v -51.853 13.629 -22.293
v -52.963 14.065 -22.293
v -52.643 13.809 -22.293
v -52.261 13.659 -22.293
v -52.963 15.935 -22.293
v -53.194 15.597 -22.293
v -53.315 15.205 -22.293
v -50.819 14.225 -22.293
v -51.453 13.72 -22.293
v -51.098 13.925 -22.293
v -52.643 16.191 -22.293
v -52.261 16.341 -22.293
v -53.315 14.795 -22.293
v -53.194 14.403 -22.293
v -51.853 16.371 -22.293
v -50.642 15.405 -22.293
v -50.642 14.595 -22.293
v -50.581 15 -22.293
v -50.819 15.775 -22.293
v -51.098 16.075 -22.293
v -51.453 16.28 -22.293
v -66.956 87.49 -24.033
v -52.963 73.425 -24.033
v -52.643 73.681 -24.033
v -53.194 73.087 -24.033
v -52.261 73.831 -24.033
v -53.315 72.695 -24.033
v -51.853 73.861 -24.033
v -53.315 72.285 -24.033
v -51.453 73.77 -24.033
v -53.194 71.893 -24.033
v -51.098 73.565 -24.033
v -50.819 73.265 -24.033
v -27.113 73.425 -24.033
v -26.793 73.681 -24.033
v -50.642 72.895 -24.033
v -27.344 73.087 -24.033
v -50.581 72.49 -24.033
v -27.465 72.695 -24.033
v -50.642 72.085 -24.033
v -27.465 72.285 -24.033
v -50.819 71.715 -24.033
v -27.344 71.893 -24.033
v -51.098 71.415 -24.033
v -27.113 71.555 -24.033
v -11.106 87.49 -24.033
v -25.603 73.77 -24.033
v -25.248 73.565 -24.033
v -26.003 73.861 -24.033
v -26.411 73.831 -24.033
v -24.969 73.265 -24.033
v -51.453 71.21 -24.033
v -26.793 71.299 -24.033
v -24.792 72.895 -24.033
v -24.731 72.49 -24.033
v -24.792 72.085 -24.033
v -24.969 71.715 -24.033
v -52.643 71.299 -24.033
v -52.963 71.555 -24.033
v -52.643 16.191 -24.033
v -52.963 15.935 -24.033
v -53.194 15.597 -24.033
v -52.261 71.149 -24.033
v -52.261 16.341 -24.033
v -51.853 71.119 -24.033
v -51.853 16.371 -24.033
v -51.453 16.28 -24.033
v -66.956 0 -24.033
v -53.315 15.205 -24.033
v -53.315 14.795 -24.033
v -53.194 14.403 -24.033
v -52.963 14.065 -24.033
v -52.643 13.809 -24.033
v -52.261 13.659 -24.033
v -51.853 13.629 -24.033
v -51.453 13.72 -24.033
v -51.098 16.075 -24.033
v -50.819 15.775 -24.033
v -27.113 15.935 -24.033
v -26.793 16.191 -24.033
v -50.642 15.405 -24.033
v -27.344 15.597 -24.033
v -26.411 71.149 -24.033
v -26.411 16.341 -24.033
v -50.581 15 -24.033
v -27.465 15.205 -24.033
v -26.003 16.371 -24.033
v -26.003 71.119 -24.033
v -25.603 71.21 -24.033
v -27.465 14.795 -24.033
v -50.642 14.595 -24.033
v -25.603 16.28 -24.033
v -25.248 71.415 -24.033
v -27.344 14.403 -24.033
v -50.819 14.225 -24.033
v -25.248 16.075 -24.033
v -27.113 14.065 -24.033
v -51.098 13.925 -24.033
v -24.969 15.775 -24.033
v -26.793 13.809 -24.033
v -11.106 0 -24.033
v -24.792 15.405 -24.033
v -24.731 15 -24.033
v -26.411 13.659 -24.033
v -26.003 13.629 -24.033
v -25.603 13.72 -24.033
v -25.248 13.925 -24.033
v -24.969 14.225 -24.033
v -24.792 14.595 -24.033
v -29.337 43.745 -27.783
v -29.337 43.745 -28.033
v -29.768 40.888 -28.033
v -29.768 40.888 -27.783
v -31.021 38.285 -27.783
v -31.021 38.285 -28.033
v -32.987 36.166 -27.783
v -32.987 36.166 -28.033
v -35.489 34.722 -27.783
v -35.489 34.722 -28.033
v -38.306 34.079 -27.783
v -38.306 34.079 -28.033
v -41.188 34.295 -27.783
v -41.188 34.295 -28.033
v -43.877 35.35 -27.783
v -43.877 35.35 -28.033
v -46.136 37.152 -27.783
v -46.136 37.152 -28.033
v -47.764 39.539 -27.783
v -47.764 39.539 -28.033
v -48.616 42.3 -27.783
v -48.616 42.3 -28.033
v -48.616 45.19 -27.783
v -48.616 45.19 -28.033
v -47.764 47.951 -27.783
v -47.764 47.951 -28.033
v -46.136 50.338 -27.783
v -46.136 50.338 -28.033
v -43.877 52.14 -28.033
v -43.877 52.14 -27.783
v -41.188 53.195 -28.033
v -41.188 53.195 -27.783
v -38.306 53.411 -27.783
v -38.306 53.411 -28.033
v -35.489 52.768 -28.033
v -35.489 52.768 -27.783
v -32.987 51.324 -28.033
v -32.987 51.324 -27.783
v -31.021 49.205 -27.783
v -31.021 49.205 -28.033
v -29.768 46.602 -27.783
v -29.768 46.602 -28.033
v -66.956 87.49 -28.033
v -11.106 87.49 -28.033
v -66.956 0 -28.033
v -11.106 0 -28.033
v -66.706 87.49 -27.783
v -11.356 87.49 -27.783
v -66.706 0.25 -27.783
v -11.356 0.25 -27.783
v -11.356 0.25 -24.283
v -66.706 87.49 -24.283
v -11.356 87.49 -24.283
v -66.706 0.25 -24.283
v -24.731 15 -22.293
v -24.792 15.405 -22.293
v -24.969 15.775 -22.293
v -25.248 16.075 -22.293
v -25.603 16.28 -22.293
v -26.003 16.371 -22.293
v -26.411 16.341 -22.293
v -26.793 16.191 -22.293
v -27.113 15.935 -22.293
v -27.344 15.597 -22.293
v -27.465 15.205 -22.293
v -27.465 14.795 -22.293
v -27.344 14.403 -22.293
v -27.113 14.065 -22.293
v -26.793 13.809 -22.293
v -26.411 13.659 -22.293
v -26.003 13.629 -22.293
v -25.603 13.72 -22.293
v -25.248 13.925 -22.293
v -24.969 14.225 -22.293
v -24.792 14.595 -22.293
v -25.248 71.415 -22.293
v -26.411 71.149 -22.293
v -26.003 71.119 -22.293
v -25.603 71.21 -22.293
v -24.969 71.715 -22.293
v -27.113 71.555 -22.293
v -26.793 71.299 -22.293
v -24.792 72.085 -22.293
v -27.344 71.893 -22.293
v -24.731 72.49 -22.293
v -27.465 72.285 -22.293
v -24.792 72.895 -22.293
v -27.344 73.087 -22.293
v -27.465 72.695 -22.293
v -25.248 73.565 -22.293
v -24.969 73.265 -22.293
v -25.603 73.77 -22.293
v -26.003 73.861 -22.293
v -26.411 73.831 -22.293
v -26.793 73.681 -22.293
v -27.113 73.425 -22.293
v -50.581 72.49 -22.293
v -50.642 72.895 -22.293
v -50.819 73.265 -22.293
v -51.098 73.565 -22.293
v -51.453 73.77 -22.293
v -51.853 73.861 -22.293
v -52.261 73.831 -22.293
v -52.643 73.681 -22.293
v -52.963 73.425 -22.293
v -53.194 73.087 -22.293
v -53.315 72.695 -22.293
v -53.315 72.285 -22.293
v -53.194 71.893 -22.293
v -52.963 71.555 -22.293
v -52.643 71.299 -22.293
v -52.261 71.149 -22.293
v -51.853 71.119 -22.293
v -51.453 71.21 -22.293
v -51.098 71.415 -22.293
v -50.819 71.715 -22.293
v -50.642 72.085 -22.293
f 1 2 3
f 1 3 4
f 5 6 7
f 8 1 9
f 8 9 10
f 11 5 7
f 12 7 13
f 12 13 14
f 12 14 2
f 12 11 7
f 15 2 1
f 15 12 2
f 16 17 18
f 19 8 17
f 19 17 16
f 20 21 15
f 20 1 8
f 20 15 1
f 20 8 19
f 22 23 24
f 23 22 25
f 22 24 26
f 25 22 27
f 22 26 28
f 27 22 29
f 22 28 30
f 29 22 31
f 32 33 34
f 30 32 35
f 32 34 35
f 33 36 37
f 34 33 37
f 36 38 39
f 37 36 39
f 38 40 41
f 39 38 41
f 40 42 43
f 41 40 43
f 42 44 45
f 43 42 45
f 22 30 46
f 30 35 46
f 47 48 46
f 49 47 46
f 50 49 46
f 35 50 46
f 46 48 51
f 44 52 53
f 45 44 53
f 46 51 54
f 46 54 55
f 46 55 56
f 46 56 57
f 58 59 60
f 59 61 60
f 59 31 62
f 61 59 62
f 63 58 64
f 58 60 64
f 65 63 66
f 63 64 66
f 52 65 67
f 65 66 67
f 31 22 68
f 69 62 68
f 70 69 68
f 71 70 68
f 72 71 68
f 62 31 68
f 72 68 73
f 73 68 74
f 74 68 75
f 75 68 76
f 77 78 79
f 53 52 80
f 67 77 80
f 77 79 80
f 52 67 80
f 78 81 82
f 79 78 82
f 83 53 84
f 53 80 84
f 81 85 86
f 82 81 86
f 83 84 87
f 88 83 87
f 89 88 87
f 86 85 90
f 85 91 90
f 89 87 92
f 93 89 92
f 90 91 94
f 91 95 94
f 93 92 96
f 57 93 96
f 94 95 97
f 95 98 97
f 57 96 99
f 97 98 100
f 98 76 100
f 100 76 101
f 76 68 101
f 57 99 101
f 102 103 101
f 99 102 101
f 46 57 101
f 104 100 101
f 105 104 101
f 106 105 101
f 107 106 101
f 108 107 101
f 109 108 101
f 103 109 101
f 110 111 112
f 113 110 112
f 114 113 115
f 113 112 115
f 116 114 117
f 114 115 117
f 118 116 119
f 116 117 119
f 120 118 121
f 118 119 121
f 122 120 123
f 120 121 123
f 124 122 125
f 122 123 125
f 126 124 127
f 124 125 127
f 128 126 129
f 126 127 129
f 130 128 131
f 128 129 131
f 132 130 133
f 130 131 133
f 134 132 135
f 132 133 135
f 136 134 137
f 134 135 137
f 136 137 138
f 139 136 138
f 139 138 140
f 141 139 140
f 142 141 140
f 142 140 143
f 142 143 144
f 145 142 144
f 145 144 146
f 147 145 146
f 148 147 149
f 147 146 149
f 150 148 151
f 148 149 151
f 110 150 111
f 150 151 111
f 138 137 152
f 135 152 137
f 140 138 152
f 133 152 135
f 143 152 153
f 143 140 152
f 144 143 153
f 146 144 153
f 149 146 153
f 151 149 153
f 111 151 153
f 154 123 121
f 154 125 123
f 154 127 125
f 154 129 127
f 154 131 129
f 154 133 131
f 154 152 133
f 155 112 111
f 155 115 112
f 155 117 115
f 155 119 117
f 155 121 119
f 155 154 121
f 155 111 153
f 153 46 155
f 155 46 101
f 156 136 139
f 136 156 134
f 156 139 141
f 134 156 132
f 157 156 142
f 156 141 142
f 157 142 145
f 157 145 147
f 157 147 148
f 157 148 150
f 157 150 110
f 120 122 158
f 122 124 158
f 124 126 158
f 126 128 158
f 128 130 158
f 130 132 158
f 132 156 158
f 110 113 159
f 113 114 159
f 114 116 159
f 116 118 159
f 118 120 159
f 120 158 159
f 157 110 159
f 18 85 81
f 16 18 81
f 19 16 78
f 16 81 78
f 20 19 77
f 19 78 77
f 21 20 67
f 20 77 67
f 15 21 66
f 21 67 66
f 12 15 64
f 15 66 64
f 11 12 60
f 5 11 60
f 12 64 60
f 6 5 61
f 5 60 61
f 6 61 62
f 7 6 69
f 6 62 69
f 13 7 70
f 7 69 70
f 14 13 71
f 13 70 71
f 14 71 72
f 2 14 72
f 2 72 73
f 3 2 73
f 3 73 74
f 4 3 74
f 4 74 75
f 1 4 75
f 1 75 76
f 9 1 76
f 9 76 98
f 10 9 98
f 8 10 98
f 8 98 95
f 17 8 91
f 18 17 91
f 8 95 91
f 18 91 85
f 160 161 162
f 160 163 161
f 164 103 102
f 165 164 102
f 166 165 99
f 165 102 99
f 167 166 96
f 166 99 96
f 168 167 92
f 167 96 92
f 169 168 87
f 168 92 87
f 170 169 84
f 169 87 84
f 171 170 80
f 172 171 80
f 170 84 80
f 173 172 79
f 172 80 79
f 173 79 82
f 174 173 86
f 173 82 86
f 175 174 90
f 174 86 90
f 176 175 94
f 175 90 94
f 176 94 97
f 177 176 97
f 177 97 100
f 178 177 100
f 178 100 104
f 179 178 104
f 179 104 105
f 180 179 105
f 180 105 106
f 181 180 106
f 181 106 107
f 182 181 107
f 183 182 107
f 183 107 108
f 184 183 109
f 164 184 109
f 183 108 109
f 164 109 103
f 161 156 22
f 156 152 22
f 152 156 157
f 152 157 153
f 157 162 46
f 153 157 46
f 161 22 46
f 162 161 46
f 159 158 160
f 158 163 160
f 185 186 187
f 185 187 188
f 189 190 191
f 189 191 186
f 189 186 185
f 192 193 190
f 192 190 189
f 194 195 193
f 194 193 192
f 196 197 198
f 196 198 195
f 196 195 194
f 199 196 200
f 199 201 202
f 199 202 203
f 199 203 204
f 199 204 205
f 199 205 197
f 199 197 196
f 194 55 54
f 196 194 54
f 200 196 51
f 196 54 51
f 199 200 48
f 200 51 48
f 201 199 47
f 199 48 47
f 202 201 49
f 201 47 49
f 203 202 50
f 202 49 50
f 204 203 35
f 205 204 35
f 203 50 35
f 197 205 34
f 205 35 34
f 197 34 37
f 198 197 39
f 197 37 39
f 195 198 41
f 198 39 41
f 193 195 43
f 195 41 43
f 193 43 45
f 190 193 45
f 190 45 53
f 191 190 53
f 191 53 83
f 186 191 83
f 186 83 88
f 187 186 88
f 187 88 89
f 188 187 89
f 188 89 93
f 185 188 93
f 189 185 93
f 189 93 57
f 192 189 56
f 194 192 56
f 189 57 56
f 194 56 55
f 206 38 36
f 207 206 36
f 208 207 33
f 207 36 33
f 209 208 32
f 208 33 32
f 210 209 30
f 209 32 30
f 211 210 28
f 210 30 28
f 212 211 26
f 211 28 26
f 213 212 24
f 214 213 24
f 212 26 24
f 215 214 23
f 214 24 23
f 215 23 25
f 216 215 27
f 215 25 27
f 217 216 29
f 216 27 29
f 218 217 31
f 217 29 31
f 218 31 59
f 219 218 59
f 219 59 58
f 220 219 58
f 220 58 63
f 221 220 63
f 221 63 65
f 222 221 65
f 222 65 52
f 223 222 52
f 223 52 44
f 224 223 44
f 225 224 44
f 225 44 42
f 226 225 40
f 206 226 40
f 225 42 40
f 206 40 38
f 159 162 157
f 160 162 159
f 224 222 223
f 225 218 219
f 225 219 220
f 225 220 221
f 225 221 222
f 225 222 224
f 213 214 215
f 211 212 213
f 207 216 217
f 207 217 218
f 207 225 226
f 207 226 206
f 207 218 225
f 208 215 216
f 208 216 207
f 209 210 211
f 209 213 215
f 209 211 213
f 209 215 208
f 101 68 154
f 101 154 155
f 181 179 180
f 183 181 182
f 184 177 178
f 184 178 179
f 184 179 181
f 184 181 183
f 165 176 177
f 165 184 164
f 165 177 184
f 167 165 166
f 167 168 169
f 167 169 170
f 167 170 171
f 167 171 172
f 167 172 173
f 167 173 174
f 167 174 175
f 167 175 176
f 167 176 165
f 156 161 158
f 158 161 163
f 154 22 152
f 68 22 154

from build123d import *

# Parameters (mm, degrees)
F0_W      = 55.85
F0_H      = 3
F1_DEPTH  = 87.49
F2_T      = -0.75
F3_DEPTH  = 0.75
F4_W      = 20
F4_H      = 7
F4_W_2    = 16
F4_H_2    = 3
F5_DEPTH  = 0.75
F7_ANGLE  = 90
F8_ANGLE  = 90
F10_ANGLE = 90
F11_ANGLE = 90
F12_R     = 1.5
F13_R     = 1.5
F15_ANGLE = 90
F16_DEPTH = 1
F17_R     = 1.5
F18_R     = 1.5
F19_R     = 1.49999
F20_R     = 1.49999
F21_R     = 4
F22_R     = 4
F23_W     = 55.85
F23_H     = 87.49
F24_DEPTH = 4
F25_T     = -0.25
F26_R     = 9.693411876
F27_DEPTH = 0.25
F29_R     = 1.375
F30_DEPTH = 1.74


# Not quite as in the source:
# - a fillet or chamfer is up to 0.001 mm smaller than in the source, because OpenCascade refuses the exact size


with BuildPart() as f1:
    # F0 (on Front) → F1 (new body)
    with BuildSketch(Plane.XZ):
        with Locations((-39.0305130277, -21.5327367023)):
            Rectangle(F0_W, F0_H)
    extrude(amount=-F1_DEPTH)

    # F2
    f2_openings = [f1.faces().sort_by_distance(p)[0] for p in [
        (-39.030513, 43.745, -20.032737),
    ]]
    offset(amount=F2_T, openings=f2_openings)

    # F3 (cut): a face of the model
    f3_faces = [f1.faces().sort_by_distance(p)[0] for p in [
        (-39.0305130277, 86.74, -21.1577367023),
    ]]
    extrude(f3_faces, amount=-F3_DEPTH, mode=Mode.SUBTRACT)

    # F4 (on face) → F5 (join, through all)
    with BuildSketch(Plane.XY.offset(-22.2827367023)):
        with Locations((-39.0305130277, 90.99)):
            Rectangle(F4_W, F4_H)
        with Locations((-39.0305130277, 90.99)):
            Rectangle(F4_W_2, F4_H_2, mode=Mode.SUBTRACT)
    extrude(amount=-F5_DEPTH)

    # F6 (on face) → F7 (revolve)
    with BuildSketch(Plane.YZ.offset(-66.2055130277)):
        with BuildLine():
            Line((82.49, -21.0327367023), (83.365, -21.0327367023))
            ThreePointArc((83.365, -21.0327367023), (82.49, -20.1577367023), (81.615, -21.0327367023))
            Line((81.615, -21.0327367023), (82.49, -21.0327367023))
        make_face()
    revolve(axis=Axis((-66.2055130277, 82.0525, -21.0327367023), (0, 1, 0)), revolution_arc=F7_ANGLE)

    # F6 (on face) → F8 (revolve)
    with BuildSketch(Plane.YZ.offset(-66.2055130277)):
        with BuildLine():
            Line((27.49, -21.0327367023), (28.365, -21.0327367023))
            ThreePointArc((28.365, -21.0327367023), (27.49, -20.1577367023), (26.615, -21.0327367023))
            Line((26.615, -21.0327367023), (27.49, -21.0327367023))
        make_face()
    revolve(axis=Axis((-66.2055130277, 27.0525, -21.0327367023), (0, 1, 0)), revolution_arc=F8_ANGLE)

    # F9 (on face) → F10 (revolve)
    with BuildSketch(Plane(origin=(-11.8555130277, 0, 0), x_dir=(0, -1, 0), z_dir=(-1, 0, 0))):
        with BuildLine():
            Line((-83.365, -21.0327367023), (-81.615, -21.0327367023))
            ThreePointArc((-81.615, -21.0327367023), (-82.49, -20.1577367023), (-83.365, -21.0327367023))
        make_face()
    revolve(axis=Axis((-11.8555130277, 82.49, -21.0327367023), (0, -1, 0)), revolution_arc=F10_ANGLE)

    # F9 (on face) → F11 (revolve)
    with BuildSketch(Plane(origin=(-11.8555130277, 0, 0), x_dir=(0, -1, 0), z_dir=(-1, 0, 0))):
        with BuildLine():
            Line((-28.365, -21.0327367023), (-26.615, -21.0327367023))
            ThreePointArc((-26.615, -21.0327367023), (-27.49, -20.1577367023), (-28.365, -21.0327367023))
        make_face()
    revolve(axis=Axis((-11.8555130277, 27.49, -21.0327367023), (0, -1, 0)), revolution_arc=F11_ANGLE)

    # F12
    f12_edges = [f1.edges().sort_by_distance(p)[0] for p in [
        (-66.205513, 0.75, -21.157737),
    ]]
    fillet(f12_edges, radius=F12_R)

    # F13
    f13_edges = [f1.edges().sort_by_distance(p)[0] for p in [
        (-11.855513, 0.75, -21.157737),
    ]]
    fillet(f13_edges, radius=F13_R)

    # F14 (on face) → F15 (revolve)
    with BuildSketch(Plane(origin=(0, 0.75, 0), x_dir=(-1, 0, 0), z_dir=(0, 1, 0))):
        with BuildLine():
            Line((38.1555130277, -21.0327367023), (39.9055130277, -21.0327367023))
            ThreePointArc((39.9055130277, -21.0327367023), (39.0305130277, -20.1577367023), (38.1555130277, -21.0327367023))
        make_face()
    revolve(axis=Axis((-39.0305130277, 0.75, -21.0327367023), (-1, 0, 0)), revolution_arc=F15_ANGLE)

    # F16 (add): a face of the model
    f16_faces = [f1.faces().sort_by_distance(p)[0] for p in [
        (-39.0305130277, 44.6180943483, -23.0327367023),
    ]]
    extrude(f16_faces, amount=F16_DEPTH)

    # F17
    f17_edges = [f1.edges().sort_by_distance(p)[0] for p in [
        (-47.030513, 89.49, -23.157737),
    ]]
    fillet(f17_edges, radius=F17_R)

    # F18
    f18_edges = [f1.edges().sort_by_distance(p)[0] for p in [
        (-31.030513, 89.49, -23.157737),
    ]]
    fillet(f18_edges, radius=F18_R)

    # F19 (radius 1.5 in the source; OpenCascade refuses exactly that, so slightly less here)
    f19_edges = [f1.edges().sort_by_distance(p)[0] for p in [
        (-31.030513, 92.49, -23.157737),
    ]]
    fillet(f19_edges, radius=F19_R)

    # F20 (radius 1.5 in the source; OpenCascade refuses exactly that, so slightly less here)
    f20_edges = [f1.edges().sort_by_distance(p)[0] for p in [
        (-47.030513, 92.49, -23.157737),
    ]]
    fillet(f20_edges, radius=F20_R)

    # F21
    f21_edges = [f1.edges().sort_by_distance(p)[0] for p in [
        (-29.030513, 94.49, -23.157737),
    ]]
    fillet(f21_edges, radius=F21_R)

    # F22
    f22_edges = [f1.edges().sort_by_distance(p)[0] for p in [
        (-49.030513, 94.49, -23.157737),
    ]]
    fillet(f22_edges, radius=F22_R)


with BuildPart() as f24:
    # F23 (on face) → F24 (new body)
    with BuildSketch(Plane(origin=(0, 0, -24.0327367023), x_dir=(1, 0, 0), z_dir=(0, 0, -1))):
        with Locations((-39.0305130277, -43.745)):
            Rectangle(F23_W, F23_H)
    extrude(amount=F24_DEPTH)

    # F25
    f25_openings = [f24.faces().sort_by_distance(p)[0] for p in [
        (-39.030513, 87.49, -26.032737),
    ]]
    offset(amount=F25_T, openings=f25_openings)

    # F26 (on face) → F27 (cut, through all)
    with BuildSketch(Plane(origin=(0, 0, -28.0327367023), x_dir=(1, 0, 0), z_dir=(0, 0, -1))):
        with Locations((-39.0305130277, -43.745)):
            Circle(F26_R)
    extrude(amount=-F27_DEPTH, mode=Mode.SUBTRACT)

    # F29 (on face) → F30 (join)
    with BuildSketch(Plane.XY.offset(-24.0327367023)):
        with Locations((-51.9555130277, 15)):
            Circle(F29_R)
        with Locations((-26.1055130277, 15)):
            Circle(F29_R)
        with Locations((-26.1055130277, 72.49)):
            Circle(F29_R)
        with Locations((-51.9555130277, 72.49)):
            Circle(F29_R)
    extrude(amount=F30_DEPTH)


solid = f24.part
